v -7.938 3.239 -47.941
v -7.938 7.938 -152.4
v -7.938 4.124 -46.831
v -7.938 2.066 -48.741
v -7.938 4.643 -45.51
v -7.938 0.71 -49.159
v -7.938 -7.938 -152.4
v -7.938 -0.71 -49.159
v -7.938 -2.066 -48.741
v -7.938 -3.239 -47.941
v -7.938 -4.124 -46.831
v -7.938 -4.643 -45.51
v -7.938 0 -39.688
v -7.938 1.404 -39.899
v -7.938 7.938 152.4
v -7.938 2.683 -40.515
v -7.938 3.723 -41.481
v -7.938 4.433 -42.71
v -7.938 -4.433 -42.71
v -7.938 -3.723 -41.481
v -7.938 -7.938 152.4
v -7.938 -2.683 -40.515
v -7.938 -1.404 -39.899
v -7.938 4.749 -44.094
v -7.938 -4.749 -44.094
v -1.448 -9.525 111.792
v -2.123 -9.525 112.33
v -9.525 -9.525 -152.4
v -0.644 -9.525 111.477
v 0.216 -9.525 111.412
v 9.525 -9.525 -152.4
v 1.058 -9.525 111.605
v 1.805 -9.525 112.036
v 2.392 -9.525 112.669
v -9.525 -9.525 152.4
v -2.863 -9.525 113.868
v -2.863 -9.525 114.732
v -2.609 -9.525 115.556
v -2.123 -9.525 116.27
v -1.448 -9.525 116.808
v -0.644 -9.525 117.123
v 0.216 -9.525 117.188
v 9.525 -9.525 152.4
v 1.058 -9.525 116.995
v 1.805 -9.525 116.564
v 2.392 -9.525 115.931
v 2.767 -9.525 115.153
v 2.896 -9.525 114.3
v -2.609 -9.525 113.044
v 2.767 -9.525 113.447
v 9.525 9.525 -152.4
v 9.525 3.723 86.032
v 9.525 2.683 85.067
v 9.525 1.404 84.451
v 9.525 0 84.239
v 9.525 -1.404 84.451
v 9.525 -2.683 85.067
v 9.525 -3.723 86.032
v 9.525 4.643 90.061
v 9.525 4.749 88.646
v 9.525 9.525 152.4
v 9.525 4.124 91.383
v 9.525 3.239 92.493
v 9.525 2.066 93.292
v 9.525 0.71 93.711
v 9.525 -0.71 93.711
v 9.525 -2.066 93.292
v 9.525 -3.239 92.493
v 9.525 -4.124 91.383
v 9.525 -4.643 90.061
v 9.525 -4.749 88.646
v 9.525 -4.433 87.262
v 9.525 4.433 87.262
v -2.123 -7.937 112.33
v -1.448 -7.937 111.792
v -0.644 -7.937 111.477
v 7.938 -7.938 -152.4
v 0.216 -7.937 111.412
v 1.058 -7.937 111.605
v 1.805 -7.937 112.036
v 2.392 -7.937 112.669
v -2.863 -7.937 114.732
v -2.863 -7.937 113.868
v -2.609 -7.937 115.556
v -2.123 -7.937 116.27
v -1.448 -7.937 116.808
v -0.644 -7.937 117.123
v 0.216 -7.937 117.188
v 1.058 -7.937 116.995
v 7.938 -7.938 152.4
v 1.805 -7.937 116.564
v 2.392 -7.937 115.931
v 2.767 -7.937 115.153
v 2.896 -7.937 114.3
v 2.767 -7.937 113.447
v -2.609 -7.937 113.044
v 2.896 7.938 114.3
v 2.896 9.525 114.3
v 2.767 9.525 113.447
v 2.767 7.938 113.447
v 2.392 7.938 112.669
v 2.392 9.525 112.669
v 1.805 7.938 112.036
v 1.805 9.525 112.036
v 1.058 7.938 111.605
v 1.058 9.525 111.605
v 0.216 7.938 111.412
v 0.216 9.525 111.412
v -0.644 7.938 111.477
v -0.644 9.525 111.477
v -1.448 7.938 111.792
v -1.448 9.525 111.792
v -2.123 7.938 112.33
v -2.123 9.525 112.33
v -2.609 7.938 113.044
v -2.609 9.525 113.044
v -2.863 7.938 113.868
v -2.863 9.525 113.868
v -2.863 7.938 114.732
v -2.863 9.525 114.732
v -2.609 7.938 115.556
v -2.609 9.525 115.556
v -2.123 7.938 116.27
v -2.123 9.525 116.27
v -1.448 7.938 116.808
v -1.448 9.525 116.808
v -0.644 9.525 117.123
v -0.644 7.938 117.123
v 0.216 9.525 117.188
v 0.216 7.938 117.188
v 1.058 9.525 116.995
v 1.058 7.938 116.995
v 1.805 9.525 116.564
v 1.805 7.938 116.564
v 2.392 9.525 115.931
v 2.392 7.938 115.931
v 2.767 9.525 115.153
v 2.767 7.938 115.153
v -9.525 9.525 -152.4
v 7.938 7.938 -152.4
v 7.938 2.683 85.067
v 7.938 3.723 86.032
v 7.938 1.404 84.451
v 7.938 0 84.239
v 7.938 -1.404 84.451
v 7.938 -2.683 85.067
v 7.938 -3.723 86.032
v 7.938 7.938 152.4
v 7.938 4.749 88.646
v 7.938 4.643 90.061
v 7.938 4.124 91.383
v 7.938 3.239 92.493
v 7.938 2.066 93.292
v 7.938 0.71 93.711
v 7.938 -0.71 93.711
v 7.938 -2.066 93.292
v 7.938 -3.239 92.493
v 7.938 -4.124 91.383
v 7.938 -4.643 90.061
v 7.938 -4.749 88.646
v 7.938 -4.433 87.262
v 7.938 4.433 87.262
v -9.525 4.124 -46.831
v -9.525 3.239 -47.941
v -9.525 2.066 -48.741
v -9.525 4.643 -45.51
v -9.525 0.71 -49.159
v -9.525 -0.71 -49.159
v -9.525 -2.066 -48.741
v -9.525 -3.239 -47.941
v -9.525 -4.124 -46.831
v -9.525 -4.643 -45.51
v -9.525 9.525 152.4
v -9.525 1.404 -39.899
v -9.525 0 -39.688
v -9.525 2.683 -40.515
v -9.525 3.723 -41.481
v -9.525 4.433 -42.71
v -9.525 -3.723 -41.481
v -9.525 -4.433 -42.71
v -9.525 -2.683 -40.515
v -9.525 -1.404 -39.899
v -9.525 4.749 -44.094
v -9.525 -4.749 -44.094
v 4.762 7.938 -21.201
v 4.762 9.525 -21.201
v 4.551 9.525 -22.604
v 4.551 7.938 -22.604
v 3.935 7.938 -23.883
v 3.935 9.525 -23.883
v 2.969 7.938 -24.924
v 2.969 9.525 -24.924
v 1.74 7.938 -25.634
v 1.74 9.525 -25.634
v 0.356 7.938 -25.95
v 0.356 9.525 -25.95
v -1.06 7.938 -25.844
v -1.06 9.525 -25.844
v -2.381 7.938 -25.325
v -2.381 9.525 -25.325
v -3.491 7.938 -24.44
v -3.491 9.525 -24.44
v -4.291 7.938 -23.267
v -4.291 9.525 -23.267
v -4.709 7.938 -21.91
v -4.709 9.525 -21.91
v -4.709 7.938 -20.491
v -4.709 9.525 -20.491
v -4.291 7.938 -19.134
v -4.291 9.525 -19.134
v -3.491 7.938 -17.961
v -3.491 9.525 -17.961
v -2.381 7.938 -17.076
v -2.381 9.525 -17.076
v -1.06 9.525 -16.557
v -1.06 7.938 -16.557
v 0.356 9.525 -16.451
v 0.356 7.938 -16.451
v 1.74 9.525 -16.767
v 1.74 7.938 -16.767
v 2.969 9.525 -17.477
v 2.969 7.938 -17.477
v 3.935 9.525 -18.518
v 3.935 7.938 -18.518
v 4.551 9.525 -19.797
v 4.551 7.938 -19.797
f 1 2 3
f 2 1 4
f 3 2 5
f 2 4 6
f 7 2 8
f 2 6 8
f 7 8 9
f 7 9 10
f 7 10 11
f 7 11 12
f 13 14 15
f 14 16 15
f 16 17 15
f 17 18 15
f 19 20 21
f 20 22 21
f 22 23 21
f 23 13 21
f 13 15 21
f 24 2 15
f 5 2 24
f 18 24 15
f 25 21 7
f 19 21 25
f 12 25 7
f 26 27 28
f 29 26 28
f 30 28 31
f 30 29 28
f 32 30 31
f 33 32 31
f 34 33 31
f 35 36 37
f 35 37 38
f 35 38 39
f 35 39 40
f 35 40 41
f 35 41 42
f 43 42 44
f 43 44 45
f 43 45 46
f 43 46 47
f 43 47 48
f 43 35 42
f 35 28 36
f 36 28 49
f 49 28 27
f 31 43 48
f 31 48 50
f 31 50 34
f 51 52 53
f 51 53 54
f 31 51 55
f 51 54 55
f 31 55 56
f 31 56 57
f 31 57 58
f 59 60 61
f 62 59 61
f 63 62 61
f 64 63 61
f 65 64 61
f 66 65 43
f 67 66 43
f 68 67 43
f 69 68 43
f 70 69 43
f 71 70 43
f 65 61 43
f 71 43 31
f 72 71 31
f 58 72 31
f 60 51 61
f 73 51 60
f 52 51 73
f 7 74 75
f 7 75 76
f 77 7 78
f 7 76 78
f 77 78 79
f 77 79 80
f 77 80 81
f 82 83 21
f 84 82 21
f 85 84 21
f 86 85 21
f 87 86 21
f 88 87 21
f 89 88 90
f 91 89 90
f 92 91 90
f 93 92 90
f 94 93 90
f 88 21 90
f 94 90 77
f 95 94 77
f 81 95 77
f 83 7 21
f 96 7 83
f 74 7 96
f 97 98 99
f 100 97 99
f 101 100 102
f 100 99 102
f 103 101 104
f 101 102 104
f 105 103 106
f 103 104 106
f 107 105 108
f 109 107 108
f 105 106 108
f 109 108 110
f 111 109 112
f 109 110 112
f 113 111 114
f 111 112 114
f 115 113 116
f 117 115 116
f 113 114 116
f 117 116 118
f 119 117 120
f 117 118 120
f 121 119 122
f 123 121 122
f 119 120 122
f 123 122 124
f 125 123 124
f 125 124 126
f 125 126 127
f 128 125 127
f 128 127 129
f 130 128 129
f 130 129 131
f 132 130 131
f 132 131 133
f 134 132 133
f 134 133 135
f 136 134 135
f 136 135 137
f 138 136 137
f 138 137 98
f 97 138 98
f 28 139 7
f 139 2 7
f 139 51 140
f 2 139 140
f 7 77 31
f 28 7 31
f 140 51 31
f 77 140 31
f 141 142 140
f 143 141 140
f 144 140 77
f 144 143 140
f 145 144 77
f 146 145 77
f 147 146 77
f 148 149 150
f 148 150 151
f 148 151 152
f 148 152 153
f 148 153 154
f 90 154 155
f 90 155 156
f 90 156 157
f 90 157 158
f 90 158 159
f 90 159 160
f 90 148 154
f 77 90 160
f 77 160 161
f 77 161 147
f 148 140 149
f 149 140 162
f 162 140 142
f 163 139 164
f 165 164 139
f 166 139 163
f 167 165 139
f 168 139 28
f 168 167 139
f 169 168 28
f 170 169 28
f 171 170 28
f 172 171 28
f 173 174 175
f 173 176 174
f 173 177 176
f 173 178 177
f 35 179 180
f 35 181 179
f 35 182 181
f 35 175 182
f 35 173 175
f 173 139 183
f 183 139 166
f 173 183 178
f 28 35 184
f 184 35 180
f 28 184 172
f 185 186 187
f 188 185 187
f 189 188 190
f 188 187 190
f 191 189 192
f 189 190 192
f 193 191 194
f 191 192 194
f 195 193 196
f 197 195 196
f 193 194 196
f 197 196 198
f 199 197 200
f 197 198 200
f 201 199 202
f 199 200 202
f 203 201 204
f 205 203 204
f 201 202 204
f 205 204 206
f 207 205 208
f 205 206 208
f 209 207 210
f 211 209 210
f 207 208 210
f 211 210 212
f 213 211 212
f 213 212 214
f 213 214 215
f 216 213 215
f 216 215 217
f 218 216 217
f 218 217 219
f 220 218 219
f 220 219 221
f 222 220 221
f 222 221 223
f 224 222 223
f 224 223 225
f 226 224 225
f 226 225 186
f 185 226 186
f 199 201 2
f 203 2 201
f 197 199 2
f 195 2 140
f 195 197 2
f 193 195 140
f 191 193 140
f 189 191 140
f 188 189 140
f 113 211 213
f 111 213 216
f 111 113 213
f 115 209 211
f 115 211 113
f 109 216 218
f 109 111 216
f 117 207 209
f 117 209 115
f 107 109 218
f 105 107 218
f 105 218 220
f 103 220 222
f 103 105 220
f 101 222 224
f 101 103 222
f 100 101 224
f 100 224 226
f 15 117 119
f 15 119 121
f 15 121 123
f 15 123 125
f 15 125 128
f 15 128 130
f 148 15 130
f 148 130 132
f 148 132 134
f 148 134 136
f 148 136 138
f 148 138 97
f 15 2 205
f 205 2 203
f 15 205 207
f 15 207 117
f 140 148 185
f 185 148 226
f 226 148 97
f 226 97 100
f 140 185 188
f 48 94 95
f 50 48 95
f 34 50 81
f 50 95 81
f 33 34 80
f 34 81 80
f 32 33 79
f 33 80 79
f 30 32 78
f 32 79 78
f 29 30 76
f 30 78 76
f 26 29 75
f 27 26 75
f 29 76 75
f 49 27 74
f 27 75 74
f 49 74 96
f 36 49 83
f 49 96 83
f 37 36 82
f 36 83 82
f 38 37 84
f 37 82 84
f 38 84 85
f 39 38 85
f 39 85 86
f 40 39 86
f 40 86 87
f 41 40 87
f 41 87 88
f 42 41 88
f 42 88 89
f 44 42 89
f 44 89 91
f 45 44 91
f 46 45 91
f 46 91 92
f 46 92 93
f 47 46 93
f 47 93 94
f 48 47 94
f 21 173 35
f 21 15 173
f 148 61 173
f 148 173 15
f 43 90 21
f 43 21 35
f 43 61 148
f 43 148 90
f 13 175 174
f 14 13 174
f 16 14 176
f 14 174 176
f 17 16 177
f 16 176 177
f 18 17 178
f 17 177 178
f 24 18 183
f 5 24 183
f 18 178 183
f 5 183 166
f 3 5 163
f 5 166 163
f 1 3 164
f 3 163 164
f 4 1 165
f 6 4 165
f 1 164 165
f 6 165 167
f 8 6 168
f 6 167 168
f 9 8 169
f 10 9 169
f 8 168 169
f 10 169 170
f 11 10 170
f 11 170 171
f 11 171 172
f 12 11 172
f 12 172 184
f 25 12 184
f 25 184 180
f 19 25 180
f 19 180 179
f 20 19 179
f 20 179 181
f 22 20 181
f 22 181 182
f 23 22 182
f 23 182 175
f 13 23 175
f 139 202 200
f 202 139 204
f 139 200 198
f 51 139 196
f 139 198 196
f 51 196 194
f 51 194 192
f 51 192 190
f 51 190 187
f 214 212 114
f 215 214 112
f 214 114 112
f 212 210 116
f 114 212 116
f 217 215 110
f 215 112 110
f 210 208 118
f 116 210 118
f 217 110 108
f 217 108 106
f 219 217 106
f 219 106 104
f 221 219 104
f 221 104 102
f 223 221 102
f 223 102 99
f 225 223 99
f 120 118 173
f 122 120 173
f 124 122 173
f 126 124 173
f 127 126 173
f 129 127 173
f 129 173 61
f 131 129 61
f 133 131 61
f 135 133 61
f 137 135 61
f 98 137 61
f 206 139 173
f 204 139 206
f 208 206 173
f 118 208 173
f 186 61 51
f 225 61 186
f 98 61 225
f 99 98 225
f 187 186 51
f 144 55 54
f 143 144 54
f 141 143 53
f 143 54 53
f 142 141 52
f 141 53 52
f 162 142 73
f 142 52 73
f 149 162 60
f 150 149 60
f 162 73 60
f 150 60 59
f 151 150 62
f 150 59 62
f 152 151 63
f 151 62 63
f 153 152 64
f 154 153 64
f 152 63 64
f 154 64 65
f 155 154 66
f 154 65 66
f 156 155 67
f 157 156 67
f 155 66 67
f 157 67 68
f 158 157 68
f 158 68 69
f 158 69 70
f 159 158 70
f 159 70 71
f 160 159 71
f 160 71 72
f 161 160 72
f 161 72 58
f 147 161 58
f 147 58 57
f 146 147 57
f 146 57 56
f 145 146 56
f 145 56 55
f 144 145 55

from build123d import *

# Parameters (mm, degrees)
SKETCH1_W                   = 19.05
SKETCH1_H                   = 19.05
SKETCH1_W_2                 = 15.875
SKETCH1_H_2                 = 15.875
BOSS_EXTRUDE1_DEPTH         = 152.4
SKETCH2_R                   = 2.8956
BASEPLATE_MOUNT_HOLE_DEPTH  = 20.05
PS_BRACKET_MOUNT_HOLE_REACH = 21.05
SKETCH3_R                   = 4.7625
CUT_EXTRUDE1_REACH          = 21.05
SKETCH4_R                   = 4.7625
CUT_EXTRUDE2_REACH          = 21.05
SKETCH5_R                   = 4.7625


with BuildPart() as part:
    # Sketch1 → Boss-Extrude1 (new body, symmetric)
    with BuildSketch(Plane(origin=(0, 0, 0), x_dir=(0, -1, 0), z_dir=(0, 0, 1))):
        Rectangle(SKETCH1_W, SKETCH1_H)
        Rectangle(SKETCH1_W_2, SKETCH1_H_2, mode=Mode.SUBTRACT)
    extrude(amount=BOSS_EXTRUDE1_DEPTH, both=True)

    # Sketch2 → Baseplate Mount Hole (cut, through all)
    with BuildSketch(Plane(origin=(0, 9.525, 0), x_dir=(1, 0, 0), z_dir=(0, 1, 0))):
        with Locations((0, -114.3)):
            Circle(SKETCH2_R)
    extrude(amount=-BASEPLATE_MOUNT_HOLE_DEPTH, mode=Mode.SUBTRACT)

    # Sketch3 → PS Bracket Mount Hole (cut, up to next)
    with BuildSketch(Plane.ZY.offset(9.525), mode=Mode.PRIVATE) as ps_bracket_mount_hole_sk1:
        with Locations((-44.45, 0)):
            Circle(SKETCH3_R)
    ps_bracket_mount_hole_tool1 = extrude(ps_bracket_mount_hole_sk1.sketch, amount=-PS_BRACKET_MOUNT_HOLE_REACH, mode=Mode.PRIVATE) & part.part
    add(ps_bracket_mount_hole_tool1.solids().sort_by_distance((-9.525, 0, -44.45))[0], mode=Mode.SUBTRACT)

    # Sketch4 → Cut-Extrude1 (cut, up to next)
    with BuildSketch(Plane(origin=(0, 9.525, 0), x_dir=(1, 0, 0), z_dir=(0, 1, 0)), mode=Mode.PRIVATE) as cut_extrude1_sk1:
        with Locations((0, 21.200533333)):
            Circle(SKETCH4_R)
    cut_extrude1_tool1 = extrude(cut_extrude1_sk1.sketch, amount=-CUT_EXTRUDE1_REACH, mode=Mode.PRIVATE) & part.part
    add(cut_extrude1_tool1.solids().sort_by_distance((0, 9.525, -21.200533))[0], mode=Mode.SUBTRACT)

    # Sketch5 → Cut-Extrude2 (cut, up to next)
    with BuildSketch(Plane(origin=(9.525, 0, 0), x_dir=(0, 0, -1), z_dir=(1, 0, 0)), mode=Mode.PRIVATE) as cut_extrude2_sk1:
        with Locations((-89.0016, 0)):
            Circle(SKETCH5_R)
    cut_extrude2_tool1 = extrude(cut_extrude2_sk1.sketch, amount=-CUT_EXTRUDE2_REACH, mode=Mode.PRIVATE) & part.part
    add(cut_extrude2_tool1.solids().sort_by_distance((9.525, 0, 89.0016))[0], mode=Mode.SUBTRACT)


solid = part.part
